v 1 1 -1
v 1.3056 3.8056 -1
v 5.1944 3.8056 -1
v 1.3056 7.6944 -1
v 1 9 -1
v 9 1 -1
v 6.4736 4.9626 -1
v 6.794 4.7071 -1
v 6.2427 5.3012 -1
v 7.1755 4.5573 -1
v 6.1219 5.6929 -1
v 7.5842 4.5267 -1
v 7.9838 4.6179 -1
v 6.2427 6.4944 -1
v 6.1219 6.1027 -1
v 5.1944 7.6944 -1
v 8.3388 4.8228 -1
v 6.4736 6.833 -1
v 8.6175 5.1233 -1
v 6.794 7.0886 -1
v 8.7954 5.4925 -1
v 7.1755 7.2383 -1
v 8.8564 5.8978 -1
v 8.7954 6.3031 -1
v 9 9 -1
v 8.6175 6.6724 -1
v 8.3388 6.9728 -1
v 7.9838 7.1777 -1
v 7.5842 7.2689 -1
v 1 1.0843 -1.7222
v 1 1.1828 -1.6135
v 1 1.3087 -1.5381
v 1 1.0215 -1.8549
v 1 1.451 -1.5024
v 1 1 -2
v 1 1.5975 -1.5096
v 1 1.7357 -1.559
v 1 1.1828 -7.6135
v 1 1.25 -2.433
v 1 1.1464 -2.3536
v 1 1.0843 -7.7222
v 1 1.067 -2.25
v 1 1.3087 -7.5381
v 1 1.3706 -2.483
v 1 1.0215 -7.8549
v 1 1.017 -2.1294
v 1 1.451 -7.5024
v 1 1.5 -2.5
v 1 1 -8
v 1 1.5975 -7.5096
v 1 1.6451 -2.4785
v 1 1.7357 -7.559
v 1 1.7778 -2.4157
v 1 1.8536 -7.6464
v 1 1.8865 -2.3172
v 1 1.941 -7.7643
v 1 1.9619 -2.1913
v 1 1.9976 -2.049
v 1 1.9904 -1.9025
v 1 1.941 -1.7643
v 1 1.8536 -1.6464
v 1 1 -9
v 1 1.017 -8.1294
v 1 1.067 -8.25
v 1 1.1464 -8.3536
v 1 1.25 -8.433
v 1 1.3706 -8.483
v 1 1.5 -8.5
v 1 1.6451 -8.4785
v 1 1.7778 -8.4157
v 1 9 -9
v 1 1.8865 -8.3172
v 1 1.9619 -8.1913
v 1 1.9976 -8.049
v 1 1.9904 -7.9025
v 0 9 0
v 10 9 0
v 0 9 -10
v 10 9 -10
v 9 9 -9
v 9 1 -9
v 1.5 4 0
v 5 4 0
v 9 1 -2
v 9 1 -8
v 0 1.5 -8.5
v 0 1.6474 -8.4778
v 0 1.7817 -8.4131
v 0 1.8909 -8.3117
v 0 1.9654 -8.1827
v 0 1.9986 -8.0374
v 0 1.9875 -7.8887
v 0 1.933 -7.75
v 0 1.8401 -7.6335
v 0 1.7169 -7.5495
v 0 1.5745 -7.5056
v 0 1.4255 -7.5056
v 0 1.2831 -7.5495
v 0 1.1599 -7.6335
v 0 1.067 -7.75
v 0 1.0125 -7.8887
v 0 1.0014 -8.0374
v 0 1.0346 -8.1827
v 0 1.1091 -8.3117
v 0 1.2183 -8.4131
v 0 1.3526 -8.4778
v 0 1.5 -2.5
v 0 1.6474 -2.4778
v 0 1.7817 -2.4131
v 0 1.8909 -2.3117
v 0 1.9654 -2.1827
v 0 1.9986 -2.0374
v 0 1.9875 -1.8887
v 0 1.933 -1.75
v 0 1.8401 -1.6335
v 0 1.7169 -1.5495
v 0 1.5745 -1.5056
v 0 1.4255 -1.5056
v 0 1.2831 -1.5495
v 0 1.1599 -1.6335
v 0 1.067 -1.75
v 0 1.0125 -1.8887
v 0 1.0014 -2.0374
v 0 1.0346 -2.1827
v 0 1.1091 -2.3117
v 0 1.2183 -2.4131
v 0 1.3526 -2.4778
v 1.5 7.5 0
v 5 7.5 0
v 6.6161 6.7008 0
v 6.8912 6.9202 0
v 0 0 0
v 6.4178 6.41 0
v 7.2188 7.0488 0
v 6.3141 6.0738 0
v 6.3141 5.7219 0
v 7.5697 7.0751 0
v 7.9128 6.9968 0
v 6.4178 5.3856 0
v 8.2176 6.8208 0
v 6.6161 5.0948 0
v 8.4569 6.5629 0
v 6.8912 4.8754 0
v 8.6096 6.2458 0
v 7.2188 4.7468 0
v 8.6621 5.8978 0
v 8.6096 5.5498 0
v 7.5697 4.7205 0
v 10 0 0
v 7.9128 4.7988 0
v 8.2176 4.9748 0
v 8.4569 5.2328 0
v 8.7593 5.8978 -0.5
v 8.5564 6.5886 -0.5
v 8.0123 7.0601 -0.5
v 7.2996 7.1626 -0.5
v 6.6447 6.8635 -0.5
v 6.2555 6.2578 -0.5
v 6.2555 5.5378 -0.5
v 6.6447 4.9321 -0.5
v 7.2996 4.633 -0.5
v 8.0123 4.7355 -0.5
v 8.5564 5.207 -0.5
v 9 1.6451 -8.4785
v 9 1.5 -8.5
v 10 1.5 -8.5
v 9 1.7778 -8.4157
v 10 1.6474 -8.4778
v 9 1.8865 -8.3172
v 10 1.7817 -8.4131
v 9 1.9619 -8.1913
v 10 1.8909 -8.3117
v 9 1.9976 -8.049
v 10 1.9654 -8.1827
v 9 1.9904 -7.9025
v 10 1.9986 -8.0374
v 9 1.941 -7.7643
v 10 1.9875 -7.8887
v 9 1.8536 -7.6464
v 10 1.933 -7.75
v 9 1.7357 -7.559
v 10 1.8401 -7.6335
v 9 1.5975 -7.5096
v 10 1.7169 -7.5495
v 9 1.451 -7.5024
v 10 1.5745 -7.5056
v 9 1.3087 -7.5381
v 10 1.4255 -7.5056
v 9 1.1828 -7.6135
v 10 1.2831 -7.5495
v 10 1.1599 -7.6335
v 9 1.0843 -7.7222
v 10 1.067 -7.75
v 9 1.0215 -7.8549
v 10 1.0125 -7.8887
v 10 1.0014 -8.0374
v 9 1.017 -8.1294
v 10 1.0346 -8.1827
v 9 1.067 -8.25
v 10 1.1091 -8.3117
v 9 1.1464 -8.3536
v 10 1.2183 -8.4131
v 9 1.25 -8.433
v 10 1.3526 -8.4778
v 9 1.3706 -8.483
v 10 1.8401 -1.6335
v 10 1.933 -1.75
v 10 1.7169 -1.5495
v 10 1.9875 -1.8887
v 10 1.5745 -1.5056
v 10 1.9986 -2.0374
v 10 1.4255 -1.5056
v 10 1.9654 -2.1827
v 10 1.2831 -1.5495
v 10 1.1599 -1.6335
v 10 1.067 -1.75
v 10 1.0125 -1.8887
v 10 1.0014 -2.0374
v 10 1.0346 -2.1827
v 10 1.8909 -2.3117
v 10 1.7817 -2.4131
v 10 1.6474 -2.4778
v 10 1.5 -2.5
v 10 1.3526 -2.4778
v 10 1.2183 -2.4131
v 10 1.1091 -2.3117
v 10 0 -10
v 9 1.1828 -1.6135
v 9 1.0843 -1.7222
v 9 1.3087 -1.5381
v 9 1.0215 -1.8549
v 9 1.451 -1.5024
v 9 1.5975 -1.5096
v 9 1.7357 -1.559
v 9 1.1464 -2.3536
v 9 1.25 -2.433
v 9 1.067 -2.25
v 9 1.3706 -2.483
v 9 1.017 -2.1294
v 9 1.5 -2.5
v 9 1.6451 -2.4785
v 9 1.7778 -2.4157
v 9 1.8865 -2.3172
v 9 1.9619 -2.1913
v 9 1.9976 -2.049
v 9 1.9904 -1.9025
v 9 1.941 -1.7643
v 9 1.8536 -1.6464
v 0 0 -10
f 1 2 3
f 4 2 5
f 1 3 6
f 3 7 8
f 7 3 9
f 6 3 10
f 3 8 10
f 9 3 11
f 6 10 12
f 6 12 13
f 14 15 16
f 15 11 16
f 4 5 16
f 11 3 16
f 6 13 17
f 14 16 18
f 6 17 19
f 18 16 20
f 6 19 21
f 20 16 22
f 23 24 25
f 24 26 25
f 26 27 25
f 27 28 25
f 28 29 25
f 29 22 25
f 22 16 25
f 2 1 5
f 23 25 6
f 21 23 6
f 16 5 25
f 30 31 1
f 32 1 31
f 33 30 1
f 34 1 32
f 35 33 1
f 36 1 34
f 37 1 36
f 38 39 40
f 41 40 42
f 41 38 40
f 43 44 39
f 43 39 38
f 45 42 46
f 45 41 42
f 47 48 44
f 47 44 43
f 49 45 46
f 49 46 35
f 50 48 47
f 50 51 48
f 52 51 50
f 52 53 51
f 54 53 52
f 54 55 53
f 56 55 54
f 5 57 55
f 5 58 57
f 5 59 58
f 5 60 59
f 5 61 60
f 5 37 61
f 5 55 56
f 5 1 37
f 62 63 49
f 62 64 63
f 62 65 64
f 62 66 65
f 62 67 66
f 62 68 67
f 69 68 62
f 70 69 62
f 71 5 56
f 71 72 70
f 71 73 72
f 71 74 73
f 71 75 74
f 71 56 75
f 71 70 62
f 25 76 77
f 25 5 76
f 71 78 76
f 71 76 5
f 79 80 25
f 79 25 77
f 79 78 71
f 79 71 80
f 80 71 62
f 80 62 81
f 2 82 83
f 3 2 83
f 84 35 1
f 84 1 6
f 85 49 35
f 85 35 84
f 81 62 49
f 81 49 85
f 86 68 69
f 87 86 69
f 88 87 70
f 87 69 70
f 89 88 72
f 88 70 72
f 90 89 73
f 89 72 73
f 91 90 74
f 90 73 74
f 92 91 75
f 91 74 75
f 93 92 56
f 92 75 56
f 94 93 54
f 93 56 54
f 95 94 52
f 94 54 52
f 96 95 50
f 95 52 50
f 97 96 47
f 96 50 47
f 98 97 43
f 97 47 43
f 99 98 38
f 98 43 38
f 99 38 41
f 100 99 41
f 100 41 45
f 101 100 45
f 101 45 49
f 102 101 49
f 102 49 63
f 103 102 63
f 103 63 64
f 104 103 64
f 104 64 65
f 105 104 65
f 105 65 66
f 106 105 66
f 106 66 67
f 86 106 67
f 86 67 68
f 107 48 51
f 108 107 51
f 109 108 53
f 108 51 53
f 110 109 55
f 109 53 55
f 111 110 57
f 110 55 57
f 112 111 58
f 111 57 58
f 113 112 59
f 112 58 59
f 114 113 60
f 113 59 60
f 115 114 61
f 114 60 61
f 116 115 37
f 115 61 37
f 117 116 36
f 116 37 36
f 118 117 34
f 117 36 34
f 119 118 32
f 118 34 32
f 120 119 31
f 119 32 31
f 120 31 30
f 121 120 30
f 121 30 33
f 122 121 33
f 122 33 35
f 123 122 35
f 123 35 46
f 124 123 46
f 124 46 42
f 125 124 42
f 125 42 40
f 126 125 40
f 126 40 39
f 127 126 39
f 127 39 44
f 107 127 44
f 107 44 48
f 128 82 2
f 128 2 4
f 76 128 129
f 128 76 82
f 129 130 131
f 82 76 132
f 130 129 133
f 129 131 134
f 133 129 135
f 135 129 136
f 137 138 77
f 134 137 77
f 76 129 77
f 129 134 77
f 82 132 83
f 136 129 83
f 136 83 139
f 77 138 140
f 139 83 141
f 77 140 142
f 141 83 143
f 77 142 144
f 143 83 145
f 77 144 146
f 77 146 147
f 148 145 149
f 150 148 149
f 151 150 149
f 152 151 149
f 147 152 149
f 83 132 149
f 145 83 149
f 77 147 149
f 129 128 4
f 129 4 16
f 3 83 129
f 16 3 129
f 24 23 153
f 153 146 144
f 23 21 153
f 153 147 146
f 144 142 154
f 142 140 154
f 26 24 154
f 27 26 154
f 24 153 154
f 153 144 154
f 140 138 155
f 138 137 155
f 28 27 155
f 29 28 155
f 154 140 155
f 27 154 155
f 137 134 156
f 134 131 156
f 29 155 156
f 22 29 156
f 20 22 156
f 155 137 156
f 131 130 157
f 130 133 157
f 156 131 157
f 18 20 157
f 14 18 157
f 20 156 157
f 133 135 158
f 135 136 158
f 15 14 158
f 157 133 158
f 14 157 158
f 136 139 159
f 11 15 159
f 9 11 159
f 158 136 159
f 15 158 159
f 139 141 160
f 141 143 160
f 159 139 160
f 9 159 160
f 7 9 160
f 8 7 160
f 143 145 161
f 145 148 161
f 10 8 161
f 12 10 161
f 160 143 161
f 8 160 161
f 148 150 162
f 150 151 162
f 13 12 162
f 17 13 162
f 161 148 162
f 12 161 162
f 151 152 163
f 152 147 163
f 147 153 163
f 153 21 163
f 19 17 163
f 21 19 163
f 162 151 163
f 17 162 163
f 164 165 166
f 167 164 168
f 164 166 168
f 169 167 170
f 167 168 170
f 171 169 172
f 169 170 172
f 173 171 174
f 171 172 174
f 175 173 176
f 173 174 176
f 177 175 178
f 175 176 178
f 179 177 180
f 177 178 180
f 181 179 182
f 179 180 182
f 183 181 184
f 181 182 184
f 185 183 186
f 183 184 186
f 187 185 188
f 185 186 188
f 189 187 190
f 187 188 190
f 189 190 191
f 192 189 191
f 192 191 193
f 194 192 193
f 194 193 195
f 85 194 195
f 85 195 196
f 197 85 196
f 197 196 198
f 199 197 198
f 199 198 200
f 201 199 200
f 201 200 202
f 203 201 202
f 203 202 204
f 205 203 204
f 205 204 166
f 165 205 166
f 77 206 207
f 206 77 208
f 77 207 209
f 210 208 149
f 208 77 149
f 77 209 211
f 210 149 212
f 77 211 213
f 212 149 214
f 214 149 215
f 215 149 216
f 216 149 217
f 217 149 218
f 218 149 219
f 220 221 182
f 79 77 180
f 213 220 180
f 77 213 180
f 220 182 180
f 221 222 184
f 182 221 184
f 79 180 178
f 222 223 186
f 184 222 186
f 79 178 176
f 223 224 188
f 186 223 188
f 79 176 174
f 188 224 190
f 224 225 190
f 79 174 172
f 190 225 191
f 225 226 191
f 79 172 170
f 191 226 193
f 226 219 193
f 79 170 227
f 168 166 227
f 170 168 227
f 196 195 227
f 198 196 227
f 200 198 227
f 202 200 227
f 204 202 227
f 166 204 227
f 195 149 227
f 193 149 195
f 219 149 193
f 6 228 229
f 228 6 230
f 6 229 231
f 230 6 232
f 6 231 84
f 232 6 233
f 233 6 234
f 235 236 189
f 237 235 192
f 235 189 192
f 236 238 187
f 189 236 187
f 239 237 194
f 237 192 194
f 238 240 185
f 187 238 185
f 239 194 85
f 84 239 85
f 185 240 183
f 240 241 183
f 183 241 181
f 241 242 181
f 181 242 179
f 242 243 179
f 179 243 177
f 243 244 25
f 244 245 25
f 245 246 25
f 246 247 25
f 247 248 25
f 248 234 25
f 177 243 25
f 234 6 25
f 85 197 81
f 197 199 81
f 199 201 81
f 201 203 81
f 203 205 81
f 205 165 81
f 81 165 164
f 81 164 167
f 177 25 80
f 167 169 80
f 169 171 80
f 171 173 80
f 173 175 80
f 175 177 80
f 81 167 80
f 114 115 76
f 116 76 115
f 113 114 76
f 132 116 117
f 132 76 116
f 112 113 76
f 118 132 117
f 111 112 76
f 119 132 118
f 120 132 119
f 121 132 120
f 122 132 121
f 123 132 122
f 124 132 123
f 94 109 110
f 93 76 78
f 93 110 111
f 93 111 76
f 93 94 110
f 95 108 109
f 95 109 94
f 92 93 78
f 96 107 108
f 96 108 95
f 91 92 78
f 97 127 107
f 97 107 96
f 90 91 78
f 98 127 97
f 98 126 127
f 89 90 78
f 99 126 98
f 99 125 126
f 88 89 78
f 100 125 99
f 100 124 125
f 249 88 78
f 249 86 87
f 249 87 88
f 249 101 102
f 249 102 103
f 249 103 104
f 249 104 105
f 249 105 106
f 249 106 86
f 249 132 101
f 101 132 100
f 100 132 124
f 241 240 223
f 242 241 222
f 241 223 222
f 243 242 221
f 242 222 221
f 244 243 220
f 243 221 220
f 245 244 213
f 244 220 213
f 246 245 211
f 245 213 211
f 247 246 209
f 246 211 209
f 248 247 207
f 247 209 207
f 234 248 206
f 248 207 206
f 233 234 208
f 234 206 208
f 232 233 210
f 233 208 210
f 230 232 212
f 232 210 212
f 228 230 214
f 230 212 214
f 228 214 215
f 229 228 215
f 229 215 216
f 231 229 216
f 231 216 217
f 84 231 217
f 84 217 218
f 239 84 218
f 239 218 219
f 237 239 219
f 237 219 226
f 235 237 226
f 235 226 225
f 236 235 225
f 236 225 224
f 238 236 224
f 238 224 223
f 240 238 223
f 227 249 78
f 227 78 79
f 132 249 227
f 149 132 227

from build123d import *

# Parameters (mm, degrees)
ESQUISSE1_W                       = 10
ESQUISSE1_H                       = 10
BOSS_EXTRU_1_DEPTH                = 9
ESQUISSE3_R                       = 1.18058501
ENL_V_MAT_EXTRU_3_DEPTH           = 1.25
ENL_V_MAT_EXTRU_3_DRAFT           = 11
ESQUISSE3_W                       = 3.5
ESQUISSE3_H                       = 3.5
ENL_V_MAT_EXTRU_3_PROFILE_2_DEPTH = 1.25
ENL_V_MAT_EXTRU_3_PROFILE_2_DRAFT = 11
ESQUISSE5_W                       = 8
ESQUISSE5_H                       = 8
ENL_V_MAT_EXTRU_4_DEPTH           = 8
ESQUISSE7_R                       = 0.5
ENL_V_MAT_EXTRU_5_DEPTH           = 17.763054614


with BuildPart() as part:
    # Esquisse1 → Boss.-Extru.1 (new body)
    with BuildSketch(Plane(origin=(0, 0, 0), x_dir=(1, 0, 0), z_dir=(0, 1, 0))):
        with Locations((5, 5)):
            Rectangle(ESQUISSE1_W, ESQUISSE1_H)
    extrude(amount=BOSS_EXTRU_1_DEPTH)


with BuildPart() as enl_v_mat_extru_3_tool:
    # Esquisse3 → Enlèv. mat.-Extru.3 (with draft: the straight prism first)
    with BuildSketch(Plane.XY):
        with Locations((7.481483156, 5.897810635)):
            Circle(ESQUISSE3_R)
    extrude(amount=-ENL_V_MAT_EXTRU_3_DEPTH)
    # Enlèv. mat.-Extru.3: the draft: its side faces are tilted about the plane it starts from
    enl_v_mat_extru_3_sides = [enl_v_mat_extru_3_tool.faces().sort_by_distance(p)[0] for p in [
        (6.300898146, 5.897810635, -0.625),
    ]]
    draft(enl_v_mat_extru_3_sides, Plane.XY, ENL_V_MAT_EXTRU_3_DRAFT)


with BuildPart() as part_1:
    add(part.part)

    # Enlèv. mat.-Extru.3: cut by enl_v_mat_extru_3_tool
    add(enl_v_mat_extru_3_tool.part, mode=Mode.SUBTRACT)


with BuildPart() as enl_v_mat_extru_3_profile_2_tool:
    # Esquisse3 → Enlèv. mat.-Extru.3 profile 2 (with draft: the straight prism first)
    with BuildSketch(Plane.XY):
        with Locations((3.25, 5.75)):
            Rectangle(ESQUISSE3_W, ESQUISSE3_H)
    extrude(amount=-ENL_V_MAT_EXTRU_3_PROFILE_2_DEPTH)
    # Enlèv. mat.-Extru.3 profile 2: the draft: its side faces are tilted about the plane it starts from
    enl_v_mat_extru_3_profile_2_sides = [enl_v_mat_extru_3_profile_2_tool.faces().sort_by_distance(p)[0] for p in [
        (1.5, 5.75, -0.625),
        (3.25, 4, -0.625),
        (5, 5.75, -0.625),
        (3.25, 7.5, -0.625),
    ]]
    draft(enl_v_mat_extru_3_profile_2_sides, Plane.XY, ENL_V_MAT_EXTRU_3_PROFILE_2_DRAFT)


with BuildPart() as part_2:
    add(part_1.part)

    # Enlèv. mat.-Extru.3 profile 2: cut by enl_v_mat_extru_3_profile_2_tool
    add(enl_v_mat_extru_3_profile_2_tool.part, mode=Mode.SUBTRACT)

    # Esquisse5 → Enlèv. mat.-Extru.4 (cut)
    with BuildSketch(Plane(origin=(0, 9, 0), x_dir=(1, 0, 0), z_dir=(0, 1, 0))):
        with Locations((5, 5)):
            Rectangle(ESQUISSE5_W, ESQUISSE5_H)
    extrude(amount=-ENL_V_MAT_EXTRU_4_DEPTH, mode=Mode.SUBTRACT)

    # Esquisse7 → Enlèv. mat.-Extru.5 (cut, through all)
    with BuildSketch(Plane(origin=(10, 0, 0), x_dir=(0, 0, -1), z_dir=(1, 0, 0))):
        with Locations((2, 1.5)):
            Circle(ESQUISSE7_R)
        with Locations((8, 1.5)):
            Circle(ESQUISSE7_R)
    extrude(amount=-ENL_V_MAT_EXTRU_5_DEPTH, mode=Mode.SUBTRACT)


solid = part_2.part
